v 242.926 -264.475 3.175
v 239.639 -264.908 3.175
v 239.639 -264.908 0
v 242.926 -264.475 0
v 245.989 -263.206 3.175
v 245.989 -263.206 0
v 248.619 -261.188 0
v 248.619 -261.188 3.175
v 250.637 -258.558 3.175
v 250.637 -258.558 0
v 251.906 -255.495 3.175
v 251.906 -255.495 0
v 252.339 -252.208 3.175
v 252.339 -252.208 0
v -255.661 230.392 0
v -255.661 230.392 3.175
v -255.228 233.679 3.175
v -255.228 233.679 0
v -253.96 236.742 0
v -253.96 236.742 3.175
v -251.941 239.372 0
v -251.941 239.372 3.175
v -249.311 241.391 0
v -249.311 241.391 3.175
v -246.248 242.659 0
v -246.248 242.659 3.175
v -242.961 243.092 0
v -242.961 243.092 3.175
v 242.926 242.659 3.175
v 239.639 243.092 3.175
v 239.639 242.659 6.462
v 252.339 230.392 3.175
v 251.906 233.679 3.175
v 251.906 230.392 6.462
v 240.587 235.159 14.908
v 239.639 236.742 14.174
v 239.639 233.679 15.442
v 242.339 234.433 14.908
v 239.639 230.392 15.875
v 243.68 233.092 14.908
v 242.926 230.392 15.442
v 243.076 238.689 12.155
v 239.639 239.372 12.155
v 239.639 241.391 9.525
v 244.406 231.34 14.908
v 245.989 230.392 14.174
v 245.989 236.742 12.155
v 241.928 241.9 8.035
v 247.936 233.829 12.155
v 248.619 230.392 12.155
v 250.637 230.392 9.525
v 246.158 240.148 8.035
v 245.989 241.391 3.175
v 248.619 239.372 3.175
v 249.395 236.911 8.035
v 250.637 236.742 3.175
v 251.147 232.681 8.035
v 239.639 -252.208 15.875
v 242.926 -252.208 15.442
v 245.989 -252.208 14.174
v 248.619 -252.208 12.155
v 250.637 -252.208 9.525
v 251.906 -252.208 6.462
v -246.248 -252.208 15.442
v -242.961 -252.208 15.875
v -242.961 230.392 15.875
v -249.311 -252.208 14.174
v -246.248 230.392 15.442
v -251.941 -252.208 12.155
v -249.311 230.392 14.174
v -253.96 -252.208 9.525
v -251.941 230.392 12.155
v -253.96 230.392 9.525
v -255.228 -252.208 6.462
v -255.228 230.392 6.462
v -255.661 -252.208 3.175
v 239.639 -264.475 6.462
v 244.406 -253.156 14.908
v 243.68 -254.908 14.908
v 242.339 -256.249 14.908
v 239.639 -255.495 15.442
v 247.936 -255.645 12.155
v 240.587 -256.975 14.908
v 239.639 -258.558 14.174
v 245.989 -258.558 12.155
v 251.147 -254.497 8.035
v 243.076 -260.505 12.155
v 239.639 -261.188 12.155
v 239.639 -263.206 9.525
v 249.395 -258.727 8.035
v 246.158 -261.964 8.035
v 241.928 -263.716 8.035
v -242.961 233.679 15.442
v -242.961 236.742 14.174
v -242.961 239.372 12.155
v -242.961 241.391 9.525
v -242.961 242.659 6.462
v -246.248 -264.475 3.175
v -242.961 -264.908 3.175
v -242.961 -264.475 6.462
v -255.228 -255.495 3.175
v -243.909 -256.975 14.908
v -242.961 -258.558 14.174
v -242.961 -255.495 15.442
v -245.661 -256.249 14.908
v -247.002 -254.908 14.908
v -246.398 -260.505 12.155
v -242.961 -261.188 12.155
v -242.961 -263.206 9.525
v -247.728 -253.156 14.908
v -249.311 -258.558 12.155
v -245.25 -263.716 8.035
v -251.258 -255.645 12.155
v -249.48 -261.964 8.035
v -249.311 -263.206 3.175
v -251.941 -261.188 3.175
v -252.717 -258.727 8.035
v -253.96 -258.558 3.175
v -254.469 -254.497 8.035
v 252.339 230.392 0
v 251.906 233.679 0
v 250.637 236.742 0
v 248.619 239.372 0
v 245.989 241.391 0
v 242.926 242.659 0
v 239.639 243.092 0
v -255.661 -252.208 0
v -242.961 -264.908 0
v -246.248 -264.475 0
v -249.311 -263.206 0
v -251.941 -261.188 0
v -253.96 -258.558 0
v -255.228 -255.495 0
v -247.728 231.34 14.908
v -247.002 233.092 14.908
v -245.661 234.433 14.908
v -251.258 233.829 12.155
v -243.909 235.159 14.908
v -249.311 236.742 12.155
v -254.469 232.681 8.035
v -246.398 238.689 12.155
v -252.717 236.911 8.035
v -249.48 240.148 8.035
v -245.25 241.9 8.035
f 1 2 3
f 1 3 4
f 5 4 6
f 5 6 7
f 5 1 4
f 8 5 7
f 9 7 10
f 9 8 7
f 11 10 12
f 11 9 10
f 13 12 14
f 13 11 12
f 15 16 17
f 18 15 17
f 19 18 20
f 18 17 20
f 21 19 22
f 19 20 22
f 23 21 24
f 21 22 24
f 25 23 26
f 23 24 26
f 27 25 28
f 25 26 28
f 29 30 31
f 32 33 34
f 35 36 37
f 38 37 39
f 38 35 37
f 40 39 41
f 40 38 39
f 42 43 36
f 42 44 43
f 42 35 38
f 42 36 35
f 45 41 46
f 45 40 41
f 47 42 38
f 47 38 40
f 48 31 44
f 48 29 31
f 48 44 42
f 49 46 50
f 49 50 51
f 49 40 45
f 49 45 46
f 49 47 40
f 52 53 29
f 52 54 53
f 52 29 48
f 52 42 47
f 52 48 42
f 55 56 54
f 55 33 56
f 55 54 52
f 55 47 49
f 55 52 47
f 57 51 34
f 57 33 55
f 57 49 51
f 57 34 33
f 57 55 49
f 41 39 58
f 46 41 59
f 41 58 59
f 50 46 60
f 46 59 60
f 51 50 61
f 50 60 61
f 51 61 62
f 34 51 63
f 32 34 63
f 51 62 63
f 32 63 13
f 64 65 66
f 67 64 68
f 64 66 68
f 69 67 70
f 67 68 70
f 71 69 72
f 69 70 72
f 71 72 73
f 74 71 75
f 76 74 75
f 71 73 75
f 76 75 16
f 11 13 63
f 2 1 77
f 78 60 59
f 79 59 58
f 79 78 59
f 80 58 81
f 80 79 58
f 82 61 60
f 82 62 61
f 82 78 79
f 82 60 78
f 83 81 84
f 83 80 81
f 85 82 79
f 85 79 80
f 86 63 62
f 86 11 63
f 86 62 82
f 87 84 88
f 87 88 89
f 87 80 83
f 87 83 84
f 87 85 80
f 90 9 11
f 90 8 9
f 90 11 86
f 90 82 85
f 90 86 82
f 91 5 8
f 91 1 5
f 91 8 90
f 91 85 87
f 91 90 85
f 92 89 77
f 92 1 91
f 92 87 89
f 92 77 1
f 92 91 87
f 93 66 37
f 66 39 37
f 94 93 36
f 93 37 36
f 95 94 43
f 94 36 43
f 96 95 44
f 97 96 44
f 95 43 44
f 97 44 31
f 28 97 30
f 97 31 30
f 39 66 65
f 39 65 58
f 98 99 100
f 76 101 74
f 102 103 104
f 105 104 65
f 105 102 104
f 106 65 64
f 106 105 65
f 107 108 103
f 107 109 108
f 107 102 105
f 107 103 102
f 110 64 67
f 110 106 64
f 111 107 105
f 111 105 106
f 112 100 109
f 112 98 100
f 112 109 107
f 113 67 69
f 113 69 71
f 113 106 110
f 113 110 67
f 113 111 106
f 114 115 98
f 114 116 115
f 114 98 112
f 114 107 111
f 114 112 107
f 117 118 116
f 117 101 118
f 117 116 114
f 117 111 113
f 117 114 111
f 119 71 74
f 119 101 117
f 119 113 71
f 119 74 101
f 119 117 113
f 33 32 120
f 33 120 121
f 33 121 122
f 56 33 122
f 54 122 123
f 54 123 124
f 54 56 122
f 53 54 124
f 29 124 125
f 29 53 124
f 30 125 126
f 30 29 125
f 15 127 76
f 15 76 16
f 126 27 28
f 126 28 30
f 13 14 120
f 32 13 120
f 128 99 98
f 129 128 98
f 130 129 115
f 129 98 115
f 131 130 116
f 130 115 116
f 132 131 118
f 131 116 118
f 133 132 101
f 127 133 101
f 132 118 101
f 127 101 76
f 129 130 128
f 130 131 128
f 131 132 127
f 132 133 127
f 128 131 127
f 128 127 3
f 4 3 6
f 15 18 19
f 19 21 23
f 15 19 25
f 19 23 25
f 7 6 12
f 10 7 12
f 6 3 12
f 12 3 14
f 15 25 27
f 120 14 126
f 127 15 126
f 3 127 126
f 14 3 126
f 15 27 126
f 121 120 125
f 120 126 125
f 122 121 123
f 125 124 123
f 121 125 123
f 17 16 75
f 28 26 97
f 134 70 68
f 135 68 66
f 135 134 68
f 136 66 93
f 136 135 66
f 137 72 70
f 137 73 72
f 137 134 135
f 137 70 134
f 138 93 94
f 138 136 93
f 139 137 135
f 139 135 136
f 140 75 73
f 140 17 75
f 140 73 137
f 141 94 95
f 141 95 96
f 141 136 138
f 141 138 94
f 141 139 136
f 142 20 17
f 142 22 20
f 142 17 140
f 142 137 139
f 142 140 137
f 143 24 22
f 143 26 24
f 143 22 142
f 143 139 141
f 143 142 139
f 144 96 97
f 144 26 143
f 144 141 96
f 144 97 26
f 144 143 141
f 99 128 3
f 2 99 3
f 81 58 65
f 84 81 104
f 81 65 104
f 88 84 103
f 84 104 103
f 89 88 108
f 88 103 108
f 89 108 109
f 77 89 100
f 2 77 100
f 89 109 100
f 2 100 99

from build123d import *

# Parameters (mm, degrees)
F0_W     = 508
F0_H     = 508
F1_DEPTH = 15.875
F4_R     = 12.7
F5_R     = 12.7
F6_R     = 12.7


# Not quite as in the source:
# - the program builds the solid bodies; features that only make, move or delete a surface that nothing else refers to are left out


with BuildPart() as f1:
    # F0 (on Top) → F1 (new body)
    with BuildSketch(Plane.XY):
        with Locations((-1.661028713, -10.90797159)):
            Rectangle(F0_W, F0_H)
    extrude(amount=F1_DEPTH)

    # F4
    f4_edges = [f1.edges().sort_by_distance(p)[0] for p in [
        (252.338971, 243.092028, 7.9375),
        (252.338971, -264.907972, 7.9375),
    ]]
    fillet(f4_edges, radius=F4_R)

    # F5
    f5_edges = [f1.edges().sort_by_distance(p)[0] for p in [
        (-255.661029, 243.092028, 7.9375),
        (-255.661029, -264.907972, 7.9375),
    ]]
    fillet(f5_edges, radius=F5_R)

    # F6
    f6_edges = [f1.edges().sort_by_distance(p)[0] for p in [
        (-1.661029, 243.092028, 15.875),
        (-251.941285, 239.372285, 15.875),
        (248.619227, 239.372285, 15.875),
        (-255.661029, -10.907972, 15.875),
        (252.338971, -10.907972, 15.875),
        (-251.941285, -261.188228, 15.875),
        (248.619227, -261.188228, 15.875),
        (-1.661029, -264.907972, 15.875),
    ]]
    fillet(f6_edges, radius=F6_R)


solid = f1.part
